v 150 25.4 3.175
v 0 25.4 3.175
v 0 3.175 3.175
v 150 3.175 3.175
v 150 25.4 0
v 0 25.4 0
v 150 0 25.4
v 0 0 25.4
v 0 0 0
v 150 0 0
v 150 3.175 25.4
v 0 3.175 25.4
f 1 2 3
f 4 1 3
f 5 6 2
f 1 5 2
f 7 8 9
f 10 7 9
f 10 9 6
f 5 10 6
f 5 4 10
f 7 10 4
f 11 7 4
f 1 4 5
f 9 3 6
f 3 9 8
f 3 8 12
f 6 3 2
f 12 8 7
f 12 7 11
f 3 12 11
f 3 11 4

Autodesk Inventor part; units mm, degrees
ref_plane "YZ Plane" through (0, 0, 0) normal (1, 0, 0) x (0, 1, 0)
ref_plane "XZ Plane" through (0, 0, 0) normal (0, 1, 0) x (-1, 0, 0)
ref_plane "XY Plane" through (0, 0, 0) normal (0, 0, 1) x (1, 0, 0)
sketch "Sketch1" plane through (0, 0, 0) normal (1, 0, 0) x (0, 1, 0)
  line L0 (0, 0) -> (25.4, 0)
  line L1 (25.4, 0) -> (25.4, 3.175)
  line L2 (25.4, 3.175) -> (0, 3.175)
  line L3 (0, 3.175) -> (0, 0)
  line L4 (0, 0) -> (0, 25.4)
  line L5 (0, 25.4) -> (3.175, 25.4)
  line L6 (3.175, 25.4) -> (3.175, 3.175)
  point P0 (3.175, 3.175)
  dimension "d0" = 25.4
  dimension "d1" = 3.175
  dimension "d2" = 25.4
  dimension "d3" = 25.4
  dimension "d4" = 3.175
  dimension "d5" = 90
extrude "Extrusion1" add sketch "Sketch1" along normal blind 150
properties part number "SOPORTE LATERAL DE GUIA CILINDRICA"
